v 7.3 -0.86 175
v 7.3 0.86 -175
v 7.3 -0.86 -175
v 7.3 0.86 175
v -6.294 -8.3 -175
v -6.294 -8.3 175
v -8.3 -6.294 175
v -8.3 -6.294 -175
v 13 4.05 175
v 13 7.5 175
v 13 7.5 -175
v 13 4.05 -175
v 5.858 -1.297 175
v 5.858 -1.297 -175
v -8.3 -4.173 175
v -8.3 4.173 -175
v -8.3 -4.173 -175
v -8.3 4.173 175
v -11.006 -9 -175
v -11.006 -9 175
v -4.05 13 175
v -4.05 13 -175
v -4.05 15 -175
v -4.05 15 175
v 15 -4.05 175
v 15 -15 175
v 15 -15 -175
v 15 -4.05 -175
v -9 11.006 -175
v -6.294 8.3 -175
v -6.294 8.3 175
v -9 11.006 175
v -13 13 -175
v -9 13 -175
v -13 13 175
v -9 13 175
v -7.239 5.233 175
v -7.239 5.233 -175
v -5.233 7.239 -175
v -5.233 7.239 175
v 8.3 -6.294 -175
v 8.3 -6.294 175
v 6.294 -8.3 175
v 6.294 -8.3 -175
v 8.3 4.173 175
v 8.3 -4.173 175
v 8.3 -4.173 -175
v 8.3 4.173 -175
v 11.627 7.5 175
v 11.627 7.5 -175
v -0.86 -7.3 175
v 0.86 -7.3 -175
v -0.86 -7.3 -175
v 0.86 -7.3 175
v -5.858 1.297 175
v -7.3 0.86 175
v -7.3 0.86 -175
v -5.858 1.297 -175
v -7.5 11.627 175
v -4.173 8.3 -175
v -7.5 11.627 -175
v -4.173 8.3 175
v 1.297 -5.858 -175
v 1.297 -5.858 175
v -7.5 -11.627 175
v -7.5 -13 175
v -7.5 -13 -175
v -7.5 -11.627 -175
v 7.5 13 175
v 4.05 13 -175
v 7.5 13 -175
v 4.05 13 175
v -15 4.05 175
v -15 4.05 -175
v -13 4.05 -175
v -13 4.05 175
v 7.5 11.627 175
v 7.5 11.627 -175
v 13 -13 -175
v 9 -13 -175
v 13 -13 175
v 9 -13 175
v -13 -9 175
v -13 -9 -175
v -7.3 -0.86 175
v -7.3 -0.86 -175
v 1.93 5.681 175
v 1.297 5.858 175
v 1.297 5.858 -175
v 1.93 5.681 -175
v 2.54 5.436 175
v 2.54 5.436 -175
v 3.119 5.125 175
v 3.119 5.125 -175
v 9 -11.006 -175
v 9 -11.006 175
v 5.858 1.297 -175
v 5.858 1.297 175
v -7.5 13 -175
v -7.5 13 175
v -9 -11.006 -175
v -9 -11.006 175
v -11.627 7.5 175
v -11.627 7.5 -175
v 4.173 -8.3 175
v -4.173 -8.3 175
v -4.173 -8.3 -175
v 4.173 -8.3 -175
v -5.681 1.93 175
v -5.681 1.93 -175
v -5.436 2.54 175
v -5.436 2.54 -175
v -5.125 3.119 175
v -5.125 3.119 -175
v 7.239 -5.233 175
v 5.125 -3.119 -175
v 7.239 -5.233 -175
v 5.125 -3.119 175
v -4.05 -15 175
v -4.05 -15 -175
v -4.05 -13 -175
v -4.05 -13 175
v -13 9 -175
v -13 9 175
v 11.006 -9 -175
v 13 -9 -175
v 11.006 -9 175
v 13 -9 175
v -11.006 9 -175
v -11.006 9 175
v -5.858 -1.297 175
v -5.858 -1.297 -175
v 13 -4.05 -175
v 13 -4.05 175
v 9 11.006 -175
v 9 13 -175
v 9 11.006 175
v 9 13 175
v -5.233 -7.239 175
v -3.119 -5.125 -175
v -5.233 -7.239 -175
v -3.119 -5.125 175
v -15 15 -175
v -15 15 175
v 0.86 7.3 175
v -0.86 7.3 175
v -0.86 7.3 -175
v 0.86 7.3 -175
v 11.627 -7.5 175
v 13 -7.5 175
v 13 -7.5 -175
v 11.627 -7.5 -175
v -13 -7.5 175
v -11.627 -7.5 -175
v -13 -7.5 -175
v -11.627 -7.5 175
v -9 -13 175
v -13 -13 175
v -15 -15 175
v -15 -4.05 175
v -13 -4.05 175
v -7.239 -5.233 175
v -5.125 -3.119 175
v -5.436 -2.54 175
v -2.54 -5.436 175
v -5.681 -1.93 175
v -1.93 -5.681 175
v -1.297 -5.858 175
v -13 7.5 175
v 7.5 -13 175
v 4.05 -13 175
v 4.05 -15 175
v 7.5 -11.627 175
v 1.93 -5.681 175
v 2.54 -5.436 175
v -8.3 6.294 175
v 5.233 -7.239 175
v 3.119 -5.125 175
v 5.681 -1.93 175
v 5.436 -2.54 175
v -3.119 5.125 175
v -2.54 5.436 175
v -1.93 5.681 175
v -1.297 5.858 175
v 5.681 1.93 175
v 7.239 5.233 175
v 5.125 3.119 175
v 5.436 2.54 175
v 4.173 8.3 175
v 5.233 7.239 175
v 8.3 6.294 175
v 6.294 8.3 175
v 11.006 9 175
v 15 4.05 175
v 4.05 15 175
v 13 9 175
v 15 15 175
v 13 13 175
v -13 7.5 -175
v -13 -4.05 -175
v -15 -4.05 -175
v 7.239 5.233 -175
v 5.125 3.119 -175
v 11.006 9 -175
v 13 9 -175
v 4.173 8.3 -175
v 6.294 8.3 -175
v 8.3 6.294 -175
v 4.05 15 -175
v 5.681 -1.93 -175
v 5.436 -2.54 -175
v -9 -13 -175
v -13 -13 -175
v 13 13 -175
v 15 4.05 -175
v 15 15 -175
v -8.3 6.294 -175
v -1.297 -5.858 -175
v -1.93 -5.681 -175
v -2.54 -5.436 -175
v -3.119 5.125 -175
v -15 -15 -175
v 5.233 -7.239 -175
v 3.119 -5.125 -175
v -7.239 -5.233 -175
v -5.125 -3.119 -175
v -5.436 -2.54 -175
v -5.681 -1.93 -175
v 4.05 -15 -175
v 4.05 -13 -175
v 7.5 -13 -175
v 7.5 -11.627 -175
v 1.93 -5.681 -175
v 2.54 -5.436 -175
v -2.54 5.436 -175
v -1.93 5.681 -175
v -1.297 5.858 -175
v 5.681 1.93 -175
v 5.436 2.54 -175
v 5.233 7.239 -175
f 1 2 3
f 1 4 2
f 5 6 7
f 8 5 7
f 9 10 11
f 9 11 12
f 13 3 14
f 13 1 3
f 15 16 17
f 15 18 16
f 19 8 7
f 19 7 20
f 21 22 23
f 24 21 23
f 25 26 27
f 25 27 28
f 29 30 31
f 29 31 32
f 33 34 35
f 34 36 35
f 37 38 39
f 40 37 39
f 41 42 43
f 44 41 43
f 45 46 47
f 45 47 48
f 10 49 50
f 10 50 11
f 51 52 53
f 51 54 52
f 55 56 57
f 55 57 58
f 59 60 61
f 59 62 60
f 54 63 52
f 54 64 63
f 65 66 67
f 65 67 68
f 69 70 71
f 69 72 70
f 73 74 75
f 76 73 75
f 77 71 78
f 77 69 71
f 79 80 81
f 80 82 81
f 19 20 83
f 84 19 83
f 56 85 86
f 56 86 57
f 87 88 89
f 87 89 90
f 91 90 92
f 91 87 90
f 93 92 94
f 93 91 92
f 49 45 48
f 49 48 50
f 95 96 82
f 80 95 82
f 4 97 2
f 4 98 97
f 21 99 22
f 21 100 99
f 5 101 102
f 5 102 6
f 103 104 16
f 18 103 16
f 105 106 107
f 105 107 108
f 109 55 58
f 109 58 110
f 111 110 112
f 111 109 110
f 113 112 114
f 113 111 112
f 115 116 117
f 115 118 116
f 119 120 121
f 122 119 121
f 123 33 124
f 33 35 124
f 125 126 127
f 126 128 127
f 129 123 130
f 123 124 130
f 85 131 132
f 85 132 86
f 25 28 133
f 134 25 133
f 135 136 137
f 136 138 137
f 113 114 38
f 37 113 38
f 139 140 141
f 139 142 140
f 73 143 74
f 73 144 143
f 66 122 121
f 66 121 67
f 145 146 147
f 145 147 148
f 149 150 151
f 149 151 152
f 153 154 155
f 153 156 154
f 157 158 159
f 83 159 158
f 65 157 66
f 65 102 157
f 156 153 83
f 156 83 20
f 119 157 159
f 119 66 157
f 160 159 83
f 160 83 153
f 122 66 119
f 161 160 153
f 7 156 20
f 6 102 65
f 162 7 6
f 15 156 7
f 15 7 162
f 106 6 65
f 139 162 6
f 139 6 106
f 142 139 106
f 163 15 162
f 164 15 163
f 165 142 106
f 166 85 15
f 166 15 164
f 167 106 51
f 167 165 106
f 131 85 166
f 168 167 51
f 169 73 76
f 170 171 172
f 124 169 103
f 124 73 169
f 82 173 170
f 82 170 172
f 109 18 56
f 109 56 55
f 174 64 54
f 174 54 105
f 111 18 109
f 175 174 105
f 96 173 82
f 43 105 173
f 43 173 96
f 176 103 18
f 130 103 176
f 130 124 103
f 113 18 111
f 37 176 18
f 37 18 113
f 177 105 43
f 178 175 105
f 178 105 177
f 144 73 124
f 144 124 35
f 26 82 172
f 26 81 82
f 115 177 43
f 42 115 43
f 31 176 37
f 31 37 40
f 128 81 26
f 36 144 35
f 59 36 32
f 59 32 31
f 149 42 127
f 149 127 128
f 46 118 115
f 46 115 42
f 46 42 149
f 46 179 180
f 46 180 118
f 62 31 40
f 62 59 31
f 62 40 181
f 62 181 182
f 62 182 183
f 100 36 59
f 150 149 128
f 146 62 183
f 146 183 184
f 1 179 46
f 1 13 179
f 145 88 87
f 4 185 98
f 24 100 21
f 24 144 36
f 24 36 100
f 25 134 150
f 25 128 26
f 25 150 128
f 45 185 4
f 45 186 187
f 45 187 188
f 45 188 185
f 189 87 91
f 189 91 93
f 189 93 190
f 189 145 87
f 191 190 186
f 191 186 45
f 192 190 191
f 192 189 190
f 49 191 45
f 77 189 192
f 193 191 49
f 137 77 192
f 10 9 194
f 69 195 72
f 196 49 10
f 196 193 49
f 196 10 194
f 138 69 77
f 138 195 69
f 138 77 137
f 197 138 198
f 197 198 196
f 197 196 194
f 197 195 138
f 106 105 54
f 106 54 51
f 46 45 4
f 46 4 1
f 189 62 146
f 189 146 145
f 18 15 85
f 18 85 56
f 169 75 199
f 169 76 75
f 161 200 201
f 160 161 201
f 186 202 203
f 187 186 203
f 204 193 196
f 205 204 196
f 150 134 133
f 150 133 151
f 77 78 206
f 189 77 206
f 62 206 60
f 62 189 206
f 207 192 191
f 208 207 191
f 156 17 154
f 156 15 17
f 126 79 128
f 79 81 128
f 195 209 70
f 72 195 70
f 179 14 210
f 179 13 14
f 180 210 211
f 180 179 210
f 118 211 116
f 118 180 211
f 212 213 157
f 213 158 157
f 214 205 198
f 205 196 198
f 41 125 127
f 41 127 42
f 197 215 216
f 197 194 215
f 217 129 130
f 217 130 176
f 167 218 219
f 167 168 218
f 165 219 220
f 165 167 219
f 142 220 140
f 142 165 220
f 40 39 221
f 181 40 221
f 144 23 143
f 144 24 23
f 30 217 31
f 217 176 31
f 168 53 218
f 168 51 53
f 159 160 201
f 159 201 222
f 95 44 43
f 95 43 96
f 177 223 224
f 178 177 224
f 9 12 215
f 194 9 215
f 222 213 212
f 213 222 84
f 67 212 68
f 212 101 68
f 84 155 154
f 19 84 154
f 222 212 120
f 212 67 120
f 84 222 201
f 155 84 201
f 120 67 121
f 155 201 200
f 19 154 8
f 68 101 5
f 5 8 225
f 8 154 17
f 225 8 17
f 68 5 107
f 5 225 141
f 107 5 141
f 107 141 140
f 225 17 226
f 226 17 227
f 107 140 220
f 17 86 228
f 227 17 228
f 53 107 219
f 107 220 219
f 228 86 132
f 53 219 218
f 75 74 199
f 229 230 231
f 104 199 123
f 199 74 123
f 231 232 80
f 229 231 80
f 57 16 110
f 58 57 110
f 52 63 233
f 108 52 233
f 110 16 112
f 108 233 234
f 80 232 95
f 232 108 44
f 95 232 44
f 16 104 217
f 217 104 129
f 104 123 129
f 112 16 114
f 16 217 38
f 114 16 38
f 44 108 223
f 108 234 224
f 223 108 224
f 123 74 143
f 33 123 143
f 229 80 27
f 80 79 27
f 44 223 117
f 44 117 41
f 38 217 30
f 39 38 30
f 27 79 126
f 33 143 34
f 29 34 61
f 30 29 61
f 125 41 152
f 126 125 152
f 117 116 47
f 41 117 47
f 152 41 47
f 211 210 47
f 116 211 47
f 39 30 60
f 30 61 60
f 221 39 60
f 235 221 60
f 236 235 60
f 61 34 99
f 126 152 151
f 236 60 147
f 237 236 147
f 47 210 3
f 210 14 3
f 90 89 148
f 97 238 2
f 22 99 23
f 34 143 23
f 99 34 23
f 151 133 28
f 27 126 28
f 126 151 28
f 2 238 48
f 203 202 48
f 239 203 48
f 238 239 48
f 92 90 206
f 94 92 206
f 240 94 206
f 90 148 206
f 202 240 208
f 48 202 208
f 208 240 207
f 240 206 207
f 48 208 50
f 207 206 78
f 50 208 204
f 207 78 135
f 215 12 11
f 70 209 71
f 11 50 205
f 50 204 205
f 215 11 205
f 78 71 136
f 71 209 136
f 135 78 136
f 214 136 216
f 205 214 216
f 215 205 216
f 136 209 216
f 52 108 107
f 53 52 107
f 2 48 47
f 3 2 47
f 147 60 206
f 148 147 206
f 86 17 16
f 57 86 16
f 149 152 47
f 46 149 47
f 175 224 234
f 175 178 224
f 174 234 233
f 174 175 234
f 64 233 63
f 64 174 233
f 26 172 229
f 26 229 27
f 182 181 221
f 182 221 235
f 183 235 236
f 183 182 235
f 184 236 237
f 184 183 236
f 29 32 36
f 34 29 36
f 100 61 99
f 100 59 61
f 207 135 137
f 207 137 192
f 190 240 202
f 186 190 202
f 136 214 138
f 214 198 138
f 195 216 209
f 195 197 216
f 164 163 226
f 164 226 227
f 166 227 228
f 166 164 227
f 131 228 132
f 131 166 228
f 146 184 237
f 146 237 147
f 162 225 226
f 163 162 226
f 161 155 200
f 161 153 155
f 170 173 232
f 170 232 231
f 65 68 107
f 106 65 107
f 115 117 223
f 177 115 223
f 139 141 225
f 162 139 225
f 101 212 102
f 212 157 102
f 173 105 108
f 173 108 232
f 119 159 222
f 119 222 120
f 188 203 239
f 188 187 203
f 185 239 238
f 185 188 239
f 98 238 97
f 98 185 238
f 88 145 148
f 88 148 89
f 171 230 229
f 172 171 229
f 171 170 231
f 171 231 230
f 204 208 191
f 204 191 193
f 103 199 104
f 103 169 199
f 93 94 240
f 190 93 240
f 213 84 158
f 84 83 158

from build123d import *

# Parameters (mm, degrees)
RESSALTO_EXTRUS_O1_DEPTH = 175


with BuildPart() as part:
    # Esboço1 → Ressalto-extrusão1 (new, symmetric)
    with BuildSketch(Plane.XY):
        Polygon((-13, -4.05), (-15, -4.05), (-15, -15), (-4.05, -15), (-4.05, -13), (-7.5, -13), (-7.5, -11.627272727), (-4.172727273, -8.3), (4.172727273, -8.3), (7.5, -11.627272727), (7.5, -13), (4.05, -13), (4.05, -15), (15, -15), (15, -4.05), (13, -4.05), (13, -7.5), (11.627272727, -7.5), (8.3, -4.172727273), (8.3, 4.172727273), (11.627272727, 7.5), (13, 7.5), (13, 4.05), (15, 4.05), (15, 15), (4.05, 15), (4.05, 13), (7.5, 13), (7.5, 11.627272727), (4.172727273, 8.3), (-4.172727273, 8.3), (-7.5, 11.627272727), (-7.5, 13), (-4.05, 13), (-4.05, 15), (-15, 15), (-15, 4.05), (-13, 4.05), (-13, 7.5), (-11.627272727, 7.5), (-8.3, 4.172727273), (-8.3, -4.172727273), (-11.627272727, -7.5), (-13, -7.5), align=None)
        with BuildLine():
            Line((-7.239339828, -5.233387445), (-5.125358847, -3.119406464))
            ThreePointArc((-5.125358847, -3.119406464), (-5.566897716, -2.238224702), (-5.858217272, -1.296645823))
            Line((-5.858217272, -1.296645823), (-7.3, -0.859788435))
            Line((-7.3, -0.859788435), (-7.3, 0.859788435))
            Line((-7.3, 0.859788435), (-5.858217272, 1.296645823))
            ThreePointArc((-5.858217272, 1.296645823), (-5.566897716, 2.238224702), (-5.125358847, 3.119406464))
            Line((-5.125358847, 3.119406464), (-7.239339828, 5.233387445))
            Line((-7.239339828, 5.233387445), (-5.233387445, 7.239339828))
            Line((-5.233387445, 7.239339828), (-3.119406464, 5.125358847))
            ThreePointArc((-3.119406464, 5.125358847), (-2.238224702, 5.566897716), (-1.296645823, 5.858217272))
            Line((-1.296645823, 5.858217272), (-0.859788435, 7.3))
            Line((-0.859788435, 7.3), (0.859788435, 7.3))
            Line((0.859788435, 7.3), (1.296645823, 5.858217272))
            ThreePointArc((1.296645823, 5.858217272), (2.238224702, 5.566897716), (3.119406464, 5.125358847))
            Line((3.119406464, 5.125358847), (5.233387445, 7.239339828))
            Line((5.233387445, 7.239339828), (7.239339828, 5.233387445))
            Line((7.239339828, 5.233387445), (5.125358847, 3.119406464))
            ThreePointArc((5.125358847, 3.119406464), (5.566897716, 2.238224702), (5.858217272, 1.296645823))
            Line((5.858217272, 1.296645823), (7.3, 0.859788435))
            Line((7.3, 0.859788435), (7.3, -0.859788435))
            Line((7.3, -0.859788435), (5.858217272, -1.296645823))
            ThreePointArc((5.858217272, -1.296645823), (5.566897716, -2.238224702), (5.125358847, -3.119406464))
            Line((5.125358847, -3.119406464), (7.239339828, -5.233387445))
            Line((7.239339828, -5.233387445), (5.233387445, -7.239339828))
            Line((5.233387445, -7.239339828), (3.119406464, -5.125358847))
            ThreePointArc((3.119406464, -5.125358847), (2.238224702, -5.566897716), (1.296645823, -5.858217272))
            Line((1.296645823, -5.858217272), (0.859788435, -7.3))
            Line((0.859788435, -7.3), (-0.859788435, -7.3))
            Line((-0.859788435, -7.3), (-1.296645823, -5.858217272))
            ThreePointArc((-1.296645823, -5.858217272), (-2.238224702, -5.566897716), (-3.119406464, -5.125358847))
            Line((-3.119406464, -5.125358847), (-5.233387445, -7.239339828))
            Line((-5.233387445, -7.239339828), (-7.239339828, -5.233387445))
        make_face(mode=Mode.SUBTRACT)
        Polygon((-11.005952384, -9), (-13, -9), (-13, -13), (-9, -13), (-9, -11.005952384), (-6.294047616, -8.3), (-8.3, -6.294047616), align=None, mode=Mode.SUBTRACT)
        Polygon((9, -11.005952384), (9, -13), (13, -13), (13, -9), (11.005952384, -9), (8.3, -6.294047616), (6.294047616, -8.3), align=None, mode=Mode.SUBTRACT)
        Polygon((11.005952384, 9), (13, 9), (13, 13), (9, 13), (9, 11.005952384), (6.294047616, 8.3), (8.3, 6.294047616), align=None, mode=Mode.SUBTRACT)
        Polygon((-9, 11.005952384), (-9, 13), (-13, 13), (-13, 9), (-11.005952384, 9), (-8.3, 6.294047616), (-6.294047616, 8.3), align=None, mode=Mode.SUBTRACT)
    extrude(amount=RESSALTO_EXTRUS_O1_DEPTH, both=True)


solid = part.part
